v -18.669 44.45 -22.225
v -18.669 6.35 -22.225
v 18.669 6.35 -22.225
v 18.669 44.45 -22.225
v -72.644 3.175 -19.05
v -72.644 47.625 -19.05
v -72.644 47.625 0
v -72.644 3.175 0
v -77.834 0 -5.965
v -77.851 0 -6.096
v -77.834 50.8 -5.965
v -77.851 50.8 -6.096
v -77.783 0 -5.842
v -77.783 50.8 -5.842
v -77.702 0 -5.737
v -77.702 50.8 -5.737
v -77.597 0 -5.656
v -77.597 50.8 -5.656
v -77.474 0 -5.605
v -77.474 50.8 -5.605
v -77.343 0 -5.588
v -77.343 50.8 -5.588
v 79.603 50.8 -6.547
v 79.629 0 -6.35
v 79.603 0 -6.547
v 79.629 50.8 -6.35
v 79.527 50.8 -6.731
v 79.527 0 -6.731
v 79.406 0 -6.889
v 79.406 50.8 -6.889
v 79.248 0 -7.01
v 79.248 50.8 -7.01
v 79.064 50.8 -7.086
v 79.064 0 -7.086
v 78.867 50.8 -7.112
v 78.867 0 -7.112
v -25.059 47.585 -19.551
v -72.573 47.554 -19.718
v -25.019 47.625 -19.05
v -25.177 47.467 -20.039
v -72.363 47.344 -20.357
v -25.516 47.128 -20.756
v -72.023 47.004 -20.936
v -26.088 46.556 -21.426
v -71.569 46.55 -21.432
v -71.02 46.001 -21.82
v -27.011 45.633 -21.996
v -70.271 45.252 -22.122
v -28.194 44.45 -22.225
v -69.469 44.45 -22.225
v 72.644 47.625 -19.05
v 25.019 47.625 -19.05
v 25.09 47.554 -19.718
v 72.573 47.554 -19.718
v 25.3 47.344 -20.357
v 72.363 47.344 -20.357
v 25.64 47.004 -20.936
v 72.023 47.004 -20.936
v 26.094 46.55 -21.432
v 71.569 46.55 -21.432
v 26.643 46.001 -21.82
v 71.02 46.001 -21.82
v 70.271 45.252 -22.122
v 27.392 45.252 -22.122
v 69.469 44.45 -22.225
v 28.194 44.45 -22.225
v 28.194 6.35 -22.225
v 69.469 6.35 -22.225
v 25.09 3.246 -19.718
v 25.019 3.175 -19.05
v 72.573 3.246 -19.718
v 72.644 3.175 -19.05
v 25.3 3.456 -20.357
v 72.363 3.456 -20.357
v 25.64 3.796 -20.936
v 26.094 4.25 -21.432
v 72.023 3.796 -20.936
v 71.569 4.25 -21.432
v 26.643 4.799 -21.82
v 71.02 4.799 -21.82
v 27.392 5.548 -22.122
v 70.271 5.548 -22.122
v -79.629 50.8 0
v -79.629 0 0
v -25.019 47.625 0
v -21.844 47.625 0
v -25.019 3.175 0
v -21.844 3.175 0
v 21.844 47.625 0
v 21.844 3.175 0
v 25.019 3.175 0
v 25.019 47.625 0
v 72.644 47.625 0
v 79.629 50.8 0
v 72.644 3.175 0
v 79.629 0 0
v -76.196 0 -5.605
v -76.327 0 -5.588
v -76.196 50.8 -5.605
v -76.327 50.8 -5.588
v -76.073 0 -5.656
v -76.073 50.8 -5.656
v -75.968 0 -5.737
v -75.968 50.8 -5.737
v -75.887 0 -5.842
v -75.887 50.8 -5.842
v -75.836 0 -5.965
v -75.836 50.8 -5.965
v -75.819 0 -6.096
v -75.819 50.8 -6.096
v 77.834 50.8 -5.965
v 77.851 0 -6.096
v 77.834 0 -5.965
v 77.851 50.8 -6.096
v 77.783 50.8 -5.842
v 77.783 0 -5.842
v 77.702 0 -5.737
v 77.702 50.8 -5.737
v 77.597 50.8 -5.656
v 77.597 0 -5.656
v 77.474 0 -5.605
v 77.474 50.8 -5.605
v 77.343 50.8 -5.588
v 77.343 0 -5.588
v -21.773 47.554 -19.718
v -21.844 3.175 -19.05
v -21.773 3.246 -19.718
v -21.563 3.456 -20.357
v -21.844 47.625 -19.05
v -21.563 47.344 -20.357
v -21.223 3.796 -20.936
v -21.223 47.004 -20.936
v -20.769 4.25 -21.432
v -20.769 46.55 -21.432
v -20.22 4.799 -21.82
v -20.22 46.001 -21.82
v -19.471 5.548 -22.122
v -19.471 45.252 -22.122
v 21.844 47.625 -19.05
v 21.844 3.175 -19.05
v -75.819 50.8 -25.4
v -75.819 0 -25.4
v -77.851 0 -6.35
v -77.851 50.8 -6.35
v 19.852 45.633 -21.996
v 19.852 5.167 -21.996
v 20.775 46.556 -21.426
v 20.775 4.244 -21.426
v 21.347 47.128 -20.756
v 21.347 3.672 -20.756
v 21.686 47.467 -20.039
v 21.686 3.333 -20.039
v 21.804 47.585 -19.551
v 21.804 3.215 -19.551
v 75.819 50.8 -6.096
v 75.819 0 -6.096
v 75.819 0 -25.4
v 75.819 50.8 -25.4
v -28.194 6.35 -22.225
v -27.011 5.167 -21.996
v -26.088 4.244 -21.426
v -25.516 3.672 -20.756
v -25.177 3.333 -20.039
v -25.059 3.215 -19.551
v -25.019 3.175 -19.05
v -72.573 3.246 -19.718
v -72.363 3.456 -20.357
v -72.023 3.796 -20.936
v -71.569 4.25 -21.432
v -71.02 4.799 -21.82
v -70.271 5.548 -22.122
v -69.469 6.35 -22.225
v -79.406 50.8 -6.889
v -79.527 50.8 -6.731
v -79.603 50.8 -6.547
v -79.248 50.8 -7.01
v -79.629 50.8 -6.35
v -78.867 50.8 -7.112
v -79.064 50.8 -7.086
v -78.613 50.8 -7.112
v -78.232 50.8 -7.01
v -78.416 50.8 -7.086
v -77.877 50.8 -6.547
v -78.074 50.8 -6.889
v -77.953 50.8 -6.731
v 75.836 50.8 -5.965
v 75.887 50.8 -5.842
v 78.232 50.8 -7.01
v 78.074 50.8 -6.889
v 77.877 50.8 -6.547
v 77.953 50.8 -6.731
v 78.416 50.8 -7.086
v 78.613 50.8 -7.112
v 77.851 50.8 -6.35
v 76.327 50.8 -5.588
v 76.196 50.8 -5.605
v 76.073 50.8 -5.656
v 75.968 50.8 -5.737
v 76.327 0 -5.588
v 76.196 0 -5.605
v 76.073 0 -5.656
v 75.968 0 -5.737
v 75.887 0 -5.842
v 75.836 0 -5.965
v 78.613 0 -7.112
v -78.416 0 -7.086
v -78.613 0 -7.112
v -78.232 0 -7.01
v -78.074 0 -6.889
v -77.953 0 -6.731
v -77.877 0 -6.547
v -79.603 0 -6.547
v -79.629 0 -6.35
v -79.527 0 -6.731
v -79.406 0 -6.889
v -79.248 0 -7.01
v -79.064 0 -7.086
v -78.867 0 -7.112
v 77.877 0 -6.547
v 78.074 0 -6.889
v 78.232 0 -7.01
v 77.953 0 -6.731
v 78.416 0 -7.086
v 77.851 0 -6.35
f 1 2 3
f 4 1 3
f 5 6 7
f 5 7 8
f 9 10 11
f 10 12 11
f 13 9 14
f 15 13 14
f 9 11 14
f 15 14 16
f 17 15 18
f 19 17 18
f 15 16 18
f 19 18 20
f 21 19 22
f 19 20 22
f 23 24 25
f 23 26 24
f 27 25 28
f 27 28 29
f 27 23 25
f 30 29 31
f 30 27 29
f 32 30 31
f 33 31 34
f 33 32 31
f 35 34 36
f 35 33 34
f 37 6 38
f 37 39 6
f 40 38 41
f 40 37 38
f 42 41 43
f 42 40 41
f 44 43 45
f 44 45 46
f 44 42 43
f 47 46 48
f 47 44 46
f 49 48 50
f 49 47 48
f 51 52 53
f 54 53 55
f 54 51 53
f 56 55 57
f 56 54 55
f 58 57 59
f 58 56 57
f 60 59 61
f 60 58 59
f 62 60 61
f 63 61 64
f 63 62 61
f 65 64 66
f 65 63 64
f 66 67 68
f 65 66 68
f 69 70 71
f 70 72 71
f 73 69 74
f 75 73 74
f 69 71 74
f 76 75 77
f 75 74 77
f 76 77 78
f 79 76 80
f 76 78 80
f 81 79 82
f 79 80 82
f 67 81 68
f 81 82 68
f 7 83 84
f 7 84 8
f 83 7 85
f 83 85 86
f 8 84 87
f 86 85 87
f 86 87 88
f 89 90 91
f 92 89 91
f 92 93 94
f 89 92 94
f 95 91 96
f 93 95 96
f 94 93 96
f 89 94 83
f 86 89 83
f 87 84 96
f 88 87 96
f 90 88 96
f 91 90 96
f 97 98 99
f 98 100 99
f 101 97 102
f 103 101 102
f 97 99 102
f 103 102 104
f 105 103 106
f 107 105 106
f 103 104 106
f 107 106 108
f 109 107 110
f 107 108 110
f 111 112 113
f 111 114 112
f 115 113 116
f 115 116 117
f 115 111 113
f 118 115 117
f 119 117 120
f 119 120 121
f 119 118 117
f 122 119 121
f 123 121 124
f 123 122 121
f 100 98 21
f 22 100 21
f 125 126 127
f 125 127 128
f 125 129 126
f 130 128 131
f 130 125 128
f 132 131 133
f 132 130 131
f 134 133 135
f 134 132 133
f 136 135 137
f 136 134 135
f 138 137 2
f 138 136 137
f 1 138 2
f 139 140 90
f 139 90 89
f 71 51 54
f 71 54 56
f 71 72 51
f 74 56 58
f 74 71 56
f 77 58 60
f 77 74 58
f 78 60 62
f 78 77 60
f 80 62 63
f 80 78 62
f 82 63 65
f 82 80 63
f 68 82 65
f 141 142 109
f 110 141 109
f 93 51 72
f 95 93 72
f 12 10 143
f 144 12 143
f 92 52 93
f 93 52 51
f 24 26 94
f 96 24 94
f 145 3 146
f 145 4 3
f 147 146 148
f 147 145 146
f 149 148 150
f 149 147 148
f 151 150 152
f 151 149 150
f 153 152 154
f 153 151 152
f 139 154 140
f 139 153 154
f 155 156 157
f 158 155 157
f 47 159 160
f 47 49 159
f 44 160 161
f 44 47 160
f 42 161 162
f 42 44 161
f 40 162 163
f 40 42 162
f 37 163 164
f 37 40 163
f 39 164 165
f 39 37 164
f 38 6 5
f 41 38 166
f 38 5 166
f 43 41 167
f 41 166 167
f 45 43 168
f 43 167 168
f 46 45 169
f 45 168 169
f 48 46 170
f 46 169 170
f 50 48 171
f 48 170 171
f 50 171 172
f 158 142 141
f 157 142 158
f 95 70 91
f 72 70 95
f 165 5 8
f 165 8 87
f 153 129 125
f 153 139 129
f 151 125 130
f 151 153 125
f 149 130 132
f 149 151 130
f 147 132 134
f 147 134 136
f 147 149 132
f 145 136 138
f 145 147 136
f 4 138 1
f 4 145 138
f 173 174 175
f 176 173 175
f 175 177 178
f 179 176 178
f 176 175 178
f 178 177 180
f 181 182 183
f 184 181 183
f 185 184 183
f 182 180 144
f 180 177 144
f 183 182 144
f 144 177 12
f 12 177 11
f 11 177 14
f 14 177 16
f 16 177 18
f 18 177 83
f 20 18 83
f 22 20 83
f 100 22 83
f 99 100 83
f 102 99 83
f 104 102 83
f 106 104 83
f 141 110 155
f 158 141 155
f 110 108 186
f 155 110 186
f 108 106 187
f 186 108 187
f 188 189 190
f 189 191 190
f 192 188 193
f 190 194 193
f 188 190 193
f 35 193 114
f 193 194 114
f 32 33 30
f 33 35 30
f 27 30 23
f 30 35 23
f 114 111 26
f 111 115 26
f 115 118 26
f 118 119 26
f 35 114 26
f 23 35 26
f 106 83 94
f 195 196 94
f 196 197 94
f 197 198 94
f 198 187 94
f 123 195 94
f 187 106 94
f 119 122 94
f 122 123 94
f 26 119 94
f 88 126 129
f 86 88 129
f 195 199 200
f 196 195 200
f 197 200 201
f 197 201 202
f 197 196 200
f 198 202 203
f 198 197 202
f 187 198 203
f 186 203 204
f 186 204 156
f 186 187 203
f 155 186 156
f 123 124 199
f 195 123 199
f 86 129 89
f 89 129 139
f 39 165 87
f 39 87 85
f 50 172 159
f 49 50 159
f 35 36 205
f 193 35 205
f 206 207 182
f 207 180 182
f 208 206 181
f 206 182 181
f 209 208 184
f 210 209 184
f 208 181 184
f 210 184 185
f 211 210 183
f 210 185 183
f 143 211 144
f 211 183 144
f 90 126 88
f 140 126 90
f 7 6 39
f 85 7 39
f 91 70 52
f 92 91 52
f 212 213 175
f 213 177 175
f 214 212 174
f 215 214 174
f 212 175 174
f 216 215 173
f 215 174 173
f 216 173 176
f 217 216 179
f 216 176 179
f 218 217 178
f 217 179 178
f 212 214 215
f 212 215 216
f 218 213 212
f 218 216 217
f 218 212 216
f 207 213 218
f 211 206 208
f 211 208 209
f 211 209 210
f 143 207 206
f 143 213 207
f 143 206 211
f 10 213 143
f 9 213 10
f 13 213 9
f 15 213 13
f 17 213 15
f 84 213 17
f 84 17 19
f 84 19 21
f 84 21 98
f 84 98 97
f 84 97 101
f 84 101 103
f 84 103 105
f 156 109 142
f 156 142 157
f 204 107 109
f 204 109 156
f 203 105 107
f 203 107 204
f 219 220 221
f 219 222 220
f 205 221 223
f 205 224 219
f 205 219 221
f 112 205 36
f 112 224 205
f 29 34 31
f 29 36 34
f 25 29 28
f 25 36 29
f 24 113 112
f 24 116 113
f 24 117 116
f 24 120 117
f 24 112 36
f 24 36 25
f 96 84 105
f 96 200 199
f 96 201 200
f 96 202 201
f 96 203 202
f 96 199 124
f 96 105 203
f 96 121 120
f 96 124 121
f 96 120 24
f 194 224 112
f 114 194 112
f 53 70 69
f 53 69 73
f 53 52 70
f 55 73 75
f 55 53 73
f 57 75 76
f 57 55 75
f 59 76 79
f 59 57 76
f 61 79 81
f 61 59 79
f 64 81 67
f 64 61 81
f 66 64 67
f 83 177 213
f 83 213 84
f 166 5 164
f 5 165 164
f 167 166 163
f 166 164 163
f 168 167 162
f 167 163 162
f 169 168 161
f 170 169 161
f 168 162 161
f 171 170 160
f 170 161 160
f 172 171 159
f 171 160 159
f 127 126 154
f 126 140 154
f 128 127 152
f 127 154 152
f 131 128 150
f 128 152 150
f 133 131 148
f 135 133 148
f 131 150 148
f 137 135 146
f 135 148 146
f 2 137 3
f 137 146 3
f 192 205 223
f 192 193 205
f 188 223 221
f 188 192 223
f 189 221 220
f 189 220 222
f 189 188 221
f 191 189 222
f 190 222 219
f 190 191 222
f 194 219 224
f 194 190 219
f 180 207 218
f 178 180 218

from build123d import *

# Parameters (mm, degrees)
F0_W      = 159.258
F0_H      = 25.4
F1_DEPTH  = 50.8
F3_DEPTH  = 50.801
F4_R      = 0.762
F5_R      = 0.508
F7_W      = 145.288
F7_H      = 44.45
F8_DEPTH  = 22.226
F9_W      = 3.175
F9_H      = 44.45
F10_DEPTH = 22.225
F11_R     = 3.175


with BuildPart() as f1:
    # F0 (on Front) → F1 (new body)
    with BuildSketch(Plane.XZ):
        with Locations((0, -12.7)):
            Rectangle(F0_W, F0_H)
    extrude(amount=-F1_DEPTH)

    # F2 (on face) → F3 (cut, through all)
    with BuildSketch(Plane.XZ):
        Polygon((-77.851, -7.112), (-79.629, -7.112), (-79.629, -25.4), (-75.819, -25.4), (-75.819, -5.588), (-77.851, -5.588), align=None)
        Polygon((77.851, -5.588), (75.819, -5.588), (75.819, -25.4), (79.629, -25.4), (79.629, -7.112), (77.851, -7.112), align=None)
    extrude(amount=-F3_DEPTH, mode=Mode.SUBTRACT)

    # F4
    f4_edges = [f1.edges().sort_by_distance(p)[0] for p in [
        (-79.629, 25.4, -7.112),
        (-77.851, 25.4, -7.112),
        (77.851, 25.4, -7.112),
        (79.629, 25.4, -7.112),
    ]]
    fillet(f4_edges, radius=F4_R)

    # F5
    f5_edges = [f1.edges().sort_by_distance(p)[0] for p in [
        (-77.851, 25.4, -5.588),
        (-75.819, 25.4, -5.588),
        (77.851, 25.4, -5.588),
        (75.819, 25.4, -5.588),
    ]]
    fillet(f5_edges, radius=F5_R)

    # F7 (on offset) → F8 (cut, through all)
    with BuildSketch(Plane(origin=(0, 0, -22.225), x_dir=(1, 0, 0), z_dir=(0, 0, -1))):
        with Locations((0, -25.4)):
            Rectangle(F7_W, F7_H)
    extrude(amount=-F8_DEPTH, mode=Mode.SUBTRACT)

    # F9 (on face) → F10 (join, through all)
    with BuildSketch(Plane.XY.offset(-22.225)):
        with Locations((-23.4315, 25.4)):
            Rectangle(F9_W, F9_H)
        with Locations((23.4315, 25.4)):
            Rectangle(F9_W, F9_H)
    extrude(amount=F10_DEPTH)

    # F11
    f11_edges = [f1.edges().sort_by_distance(p)[0] for p in [
        (-25.019, 25.4, -22.225),
        (-48.8315, 47.625, -22.225),
        (-72.644, 25.4, -22.225),
        (-48.8315, 3.175, -22.225),
        (21.844, 25.4, -22.225),
        (0, 47.625, -22.225),
        (-21.844, 25.4, -22.225),
        (0, 3.175, -22.225),
        (72.644, 25.4, -22.225),
        (48.8315, 47.625, -22.225),
        (25.019, 25.4, -22.225),
        (48.8315, 3.175, -22.225),
    ]]
    fillet(f11_edges, radius=F11_R)


solid = f1.part
